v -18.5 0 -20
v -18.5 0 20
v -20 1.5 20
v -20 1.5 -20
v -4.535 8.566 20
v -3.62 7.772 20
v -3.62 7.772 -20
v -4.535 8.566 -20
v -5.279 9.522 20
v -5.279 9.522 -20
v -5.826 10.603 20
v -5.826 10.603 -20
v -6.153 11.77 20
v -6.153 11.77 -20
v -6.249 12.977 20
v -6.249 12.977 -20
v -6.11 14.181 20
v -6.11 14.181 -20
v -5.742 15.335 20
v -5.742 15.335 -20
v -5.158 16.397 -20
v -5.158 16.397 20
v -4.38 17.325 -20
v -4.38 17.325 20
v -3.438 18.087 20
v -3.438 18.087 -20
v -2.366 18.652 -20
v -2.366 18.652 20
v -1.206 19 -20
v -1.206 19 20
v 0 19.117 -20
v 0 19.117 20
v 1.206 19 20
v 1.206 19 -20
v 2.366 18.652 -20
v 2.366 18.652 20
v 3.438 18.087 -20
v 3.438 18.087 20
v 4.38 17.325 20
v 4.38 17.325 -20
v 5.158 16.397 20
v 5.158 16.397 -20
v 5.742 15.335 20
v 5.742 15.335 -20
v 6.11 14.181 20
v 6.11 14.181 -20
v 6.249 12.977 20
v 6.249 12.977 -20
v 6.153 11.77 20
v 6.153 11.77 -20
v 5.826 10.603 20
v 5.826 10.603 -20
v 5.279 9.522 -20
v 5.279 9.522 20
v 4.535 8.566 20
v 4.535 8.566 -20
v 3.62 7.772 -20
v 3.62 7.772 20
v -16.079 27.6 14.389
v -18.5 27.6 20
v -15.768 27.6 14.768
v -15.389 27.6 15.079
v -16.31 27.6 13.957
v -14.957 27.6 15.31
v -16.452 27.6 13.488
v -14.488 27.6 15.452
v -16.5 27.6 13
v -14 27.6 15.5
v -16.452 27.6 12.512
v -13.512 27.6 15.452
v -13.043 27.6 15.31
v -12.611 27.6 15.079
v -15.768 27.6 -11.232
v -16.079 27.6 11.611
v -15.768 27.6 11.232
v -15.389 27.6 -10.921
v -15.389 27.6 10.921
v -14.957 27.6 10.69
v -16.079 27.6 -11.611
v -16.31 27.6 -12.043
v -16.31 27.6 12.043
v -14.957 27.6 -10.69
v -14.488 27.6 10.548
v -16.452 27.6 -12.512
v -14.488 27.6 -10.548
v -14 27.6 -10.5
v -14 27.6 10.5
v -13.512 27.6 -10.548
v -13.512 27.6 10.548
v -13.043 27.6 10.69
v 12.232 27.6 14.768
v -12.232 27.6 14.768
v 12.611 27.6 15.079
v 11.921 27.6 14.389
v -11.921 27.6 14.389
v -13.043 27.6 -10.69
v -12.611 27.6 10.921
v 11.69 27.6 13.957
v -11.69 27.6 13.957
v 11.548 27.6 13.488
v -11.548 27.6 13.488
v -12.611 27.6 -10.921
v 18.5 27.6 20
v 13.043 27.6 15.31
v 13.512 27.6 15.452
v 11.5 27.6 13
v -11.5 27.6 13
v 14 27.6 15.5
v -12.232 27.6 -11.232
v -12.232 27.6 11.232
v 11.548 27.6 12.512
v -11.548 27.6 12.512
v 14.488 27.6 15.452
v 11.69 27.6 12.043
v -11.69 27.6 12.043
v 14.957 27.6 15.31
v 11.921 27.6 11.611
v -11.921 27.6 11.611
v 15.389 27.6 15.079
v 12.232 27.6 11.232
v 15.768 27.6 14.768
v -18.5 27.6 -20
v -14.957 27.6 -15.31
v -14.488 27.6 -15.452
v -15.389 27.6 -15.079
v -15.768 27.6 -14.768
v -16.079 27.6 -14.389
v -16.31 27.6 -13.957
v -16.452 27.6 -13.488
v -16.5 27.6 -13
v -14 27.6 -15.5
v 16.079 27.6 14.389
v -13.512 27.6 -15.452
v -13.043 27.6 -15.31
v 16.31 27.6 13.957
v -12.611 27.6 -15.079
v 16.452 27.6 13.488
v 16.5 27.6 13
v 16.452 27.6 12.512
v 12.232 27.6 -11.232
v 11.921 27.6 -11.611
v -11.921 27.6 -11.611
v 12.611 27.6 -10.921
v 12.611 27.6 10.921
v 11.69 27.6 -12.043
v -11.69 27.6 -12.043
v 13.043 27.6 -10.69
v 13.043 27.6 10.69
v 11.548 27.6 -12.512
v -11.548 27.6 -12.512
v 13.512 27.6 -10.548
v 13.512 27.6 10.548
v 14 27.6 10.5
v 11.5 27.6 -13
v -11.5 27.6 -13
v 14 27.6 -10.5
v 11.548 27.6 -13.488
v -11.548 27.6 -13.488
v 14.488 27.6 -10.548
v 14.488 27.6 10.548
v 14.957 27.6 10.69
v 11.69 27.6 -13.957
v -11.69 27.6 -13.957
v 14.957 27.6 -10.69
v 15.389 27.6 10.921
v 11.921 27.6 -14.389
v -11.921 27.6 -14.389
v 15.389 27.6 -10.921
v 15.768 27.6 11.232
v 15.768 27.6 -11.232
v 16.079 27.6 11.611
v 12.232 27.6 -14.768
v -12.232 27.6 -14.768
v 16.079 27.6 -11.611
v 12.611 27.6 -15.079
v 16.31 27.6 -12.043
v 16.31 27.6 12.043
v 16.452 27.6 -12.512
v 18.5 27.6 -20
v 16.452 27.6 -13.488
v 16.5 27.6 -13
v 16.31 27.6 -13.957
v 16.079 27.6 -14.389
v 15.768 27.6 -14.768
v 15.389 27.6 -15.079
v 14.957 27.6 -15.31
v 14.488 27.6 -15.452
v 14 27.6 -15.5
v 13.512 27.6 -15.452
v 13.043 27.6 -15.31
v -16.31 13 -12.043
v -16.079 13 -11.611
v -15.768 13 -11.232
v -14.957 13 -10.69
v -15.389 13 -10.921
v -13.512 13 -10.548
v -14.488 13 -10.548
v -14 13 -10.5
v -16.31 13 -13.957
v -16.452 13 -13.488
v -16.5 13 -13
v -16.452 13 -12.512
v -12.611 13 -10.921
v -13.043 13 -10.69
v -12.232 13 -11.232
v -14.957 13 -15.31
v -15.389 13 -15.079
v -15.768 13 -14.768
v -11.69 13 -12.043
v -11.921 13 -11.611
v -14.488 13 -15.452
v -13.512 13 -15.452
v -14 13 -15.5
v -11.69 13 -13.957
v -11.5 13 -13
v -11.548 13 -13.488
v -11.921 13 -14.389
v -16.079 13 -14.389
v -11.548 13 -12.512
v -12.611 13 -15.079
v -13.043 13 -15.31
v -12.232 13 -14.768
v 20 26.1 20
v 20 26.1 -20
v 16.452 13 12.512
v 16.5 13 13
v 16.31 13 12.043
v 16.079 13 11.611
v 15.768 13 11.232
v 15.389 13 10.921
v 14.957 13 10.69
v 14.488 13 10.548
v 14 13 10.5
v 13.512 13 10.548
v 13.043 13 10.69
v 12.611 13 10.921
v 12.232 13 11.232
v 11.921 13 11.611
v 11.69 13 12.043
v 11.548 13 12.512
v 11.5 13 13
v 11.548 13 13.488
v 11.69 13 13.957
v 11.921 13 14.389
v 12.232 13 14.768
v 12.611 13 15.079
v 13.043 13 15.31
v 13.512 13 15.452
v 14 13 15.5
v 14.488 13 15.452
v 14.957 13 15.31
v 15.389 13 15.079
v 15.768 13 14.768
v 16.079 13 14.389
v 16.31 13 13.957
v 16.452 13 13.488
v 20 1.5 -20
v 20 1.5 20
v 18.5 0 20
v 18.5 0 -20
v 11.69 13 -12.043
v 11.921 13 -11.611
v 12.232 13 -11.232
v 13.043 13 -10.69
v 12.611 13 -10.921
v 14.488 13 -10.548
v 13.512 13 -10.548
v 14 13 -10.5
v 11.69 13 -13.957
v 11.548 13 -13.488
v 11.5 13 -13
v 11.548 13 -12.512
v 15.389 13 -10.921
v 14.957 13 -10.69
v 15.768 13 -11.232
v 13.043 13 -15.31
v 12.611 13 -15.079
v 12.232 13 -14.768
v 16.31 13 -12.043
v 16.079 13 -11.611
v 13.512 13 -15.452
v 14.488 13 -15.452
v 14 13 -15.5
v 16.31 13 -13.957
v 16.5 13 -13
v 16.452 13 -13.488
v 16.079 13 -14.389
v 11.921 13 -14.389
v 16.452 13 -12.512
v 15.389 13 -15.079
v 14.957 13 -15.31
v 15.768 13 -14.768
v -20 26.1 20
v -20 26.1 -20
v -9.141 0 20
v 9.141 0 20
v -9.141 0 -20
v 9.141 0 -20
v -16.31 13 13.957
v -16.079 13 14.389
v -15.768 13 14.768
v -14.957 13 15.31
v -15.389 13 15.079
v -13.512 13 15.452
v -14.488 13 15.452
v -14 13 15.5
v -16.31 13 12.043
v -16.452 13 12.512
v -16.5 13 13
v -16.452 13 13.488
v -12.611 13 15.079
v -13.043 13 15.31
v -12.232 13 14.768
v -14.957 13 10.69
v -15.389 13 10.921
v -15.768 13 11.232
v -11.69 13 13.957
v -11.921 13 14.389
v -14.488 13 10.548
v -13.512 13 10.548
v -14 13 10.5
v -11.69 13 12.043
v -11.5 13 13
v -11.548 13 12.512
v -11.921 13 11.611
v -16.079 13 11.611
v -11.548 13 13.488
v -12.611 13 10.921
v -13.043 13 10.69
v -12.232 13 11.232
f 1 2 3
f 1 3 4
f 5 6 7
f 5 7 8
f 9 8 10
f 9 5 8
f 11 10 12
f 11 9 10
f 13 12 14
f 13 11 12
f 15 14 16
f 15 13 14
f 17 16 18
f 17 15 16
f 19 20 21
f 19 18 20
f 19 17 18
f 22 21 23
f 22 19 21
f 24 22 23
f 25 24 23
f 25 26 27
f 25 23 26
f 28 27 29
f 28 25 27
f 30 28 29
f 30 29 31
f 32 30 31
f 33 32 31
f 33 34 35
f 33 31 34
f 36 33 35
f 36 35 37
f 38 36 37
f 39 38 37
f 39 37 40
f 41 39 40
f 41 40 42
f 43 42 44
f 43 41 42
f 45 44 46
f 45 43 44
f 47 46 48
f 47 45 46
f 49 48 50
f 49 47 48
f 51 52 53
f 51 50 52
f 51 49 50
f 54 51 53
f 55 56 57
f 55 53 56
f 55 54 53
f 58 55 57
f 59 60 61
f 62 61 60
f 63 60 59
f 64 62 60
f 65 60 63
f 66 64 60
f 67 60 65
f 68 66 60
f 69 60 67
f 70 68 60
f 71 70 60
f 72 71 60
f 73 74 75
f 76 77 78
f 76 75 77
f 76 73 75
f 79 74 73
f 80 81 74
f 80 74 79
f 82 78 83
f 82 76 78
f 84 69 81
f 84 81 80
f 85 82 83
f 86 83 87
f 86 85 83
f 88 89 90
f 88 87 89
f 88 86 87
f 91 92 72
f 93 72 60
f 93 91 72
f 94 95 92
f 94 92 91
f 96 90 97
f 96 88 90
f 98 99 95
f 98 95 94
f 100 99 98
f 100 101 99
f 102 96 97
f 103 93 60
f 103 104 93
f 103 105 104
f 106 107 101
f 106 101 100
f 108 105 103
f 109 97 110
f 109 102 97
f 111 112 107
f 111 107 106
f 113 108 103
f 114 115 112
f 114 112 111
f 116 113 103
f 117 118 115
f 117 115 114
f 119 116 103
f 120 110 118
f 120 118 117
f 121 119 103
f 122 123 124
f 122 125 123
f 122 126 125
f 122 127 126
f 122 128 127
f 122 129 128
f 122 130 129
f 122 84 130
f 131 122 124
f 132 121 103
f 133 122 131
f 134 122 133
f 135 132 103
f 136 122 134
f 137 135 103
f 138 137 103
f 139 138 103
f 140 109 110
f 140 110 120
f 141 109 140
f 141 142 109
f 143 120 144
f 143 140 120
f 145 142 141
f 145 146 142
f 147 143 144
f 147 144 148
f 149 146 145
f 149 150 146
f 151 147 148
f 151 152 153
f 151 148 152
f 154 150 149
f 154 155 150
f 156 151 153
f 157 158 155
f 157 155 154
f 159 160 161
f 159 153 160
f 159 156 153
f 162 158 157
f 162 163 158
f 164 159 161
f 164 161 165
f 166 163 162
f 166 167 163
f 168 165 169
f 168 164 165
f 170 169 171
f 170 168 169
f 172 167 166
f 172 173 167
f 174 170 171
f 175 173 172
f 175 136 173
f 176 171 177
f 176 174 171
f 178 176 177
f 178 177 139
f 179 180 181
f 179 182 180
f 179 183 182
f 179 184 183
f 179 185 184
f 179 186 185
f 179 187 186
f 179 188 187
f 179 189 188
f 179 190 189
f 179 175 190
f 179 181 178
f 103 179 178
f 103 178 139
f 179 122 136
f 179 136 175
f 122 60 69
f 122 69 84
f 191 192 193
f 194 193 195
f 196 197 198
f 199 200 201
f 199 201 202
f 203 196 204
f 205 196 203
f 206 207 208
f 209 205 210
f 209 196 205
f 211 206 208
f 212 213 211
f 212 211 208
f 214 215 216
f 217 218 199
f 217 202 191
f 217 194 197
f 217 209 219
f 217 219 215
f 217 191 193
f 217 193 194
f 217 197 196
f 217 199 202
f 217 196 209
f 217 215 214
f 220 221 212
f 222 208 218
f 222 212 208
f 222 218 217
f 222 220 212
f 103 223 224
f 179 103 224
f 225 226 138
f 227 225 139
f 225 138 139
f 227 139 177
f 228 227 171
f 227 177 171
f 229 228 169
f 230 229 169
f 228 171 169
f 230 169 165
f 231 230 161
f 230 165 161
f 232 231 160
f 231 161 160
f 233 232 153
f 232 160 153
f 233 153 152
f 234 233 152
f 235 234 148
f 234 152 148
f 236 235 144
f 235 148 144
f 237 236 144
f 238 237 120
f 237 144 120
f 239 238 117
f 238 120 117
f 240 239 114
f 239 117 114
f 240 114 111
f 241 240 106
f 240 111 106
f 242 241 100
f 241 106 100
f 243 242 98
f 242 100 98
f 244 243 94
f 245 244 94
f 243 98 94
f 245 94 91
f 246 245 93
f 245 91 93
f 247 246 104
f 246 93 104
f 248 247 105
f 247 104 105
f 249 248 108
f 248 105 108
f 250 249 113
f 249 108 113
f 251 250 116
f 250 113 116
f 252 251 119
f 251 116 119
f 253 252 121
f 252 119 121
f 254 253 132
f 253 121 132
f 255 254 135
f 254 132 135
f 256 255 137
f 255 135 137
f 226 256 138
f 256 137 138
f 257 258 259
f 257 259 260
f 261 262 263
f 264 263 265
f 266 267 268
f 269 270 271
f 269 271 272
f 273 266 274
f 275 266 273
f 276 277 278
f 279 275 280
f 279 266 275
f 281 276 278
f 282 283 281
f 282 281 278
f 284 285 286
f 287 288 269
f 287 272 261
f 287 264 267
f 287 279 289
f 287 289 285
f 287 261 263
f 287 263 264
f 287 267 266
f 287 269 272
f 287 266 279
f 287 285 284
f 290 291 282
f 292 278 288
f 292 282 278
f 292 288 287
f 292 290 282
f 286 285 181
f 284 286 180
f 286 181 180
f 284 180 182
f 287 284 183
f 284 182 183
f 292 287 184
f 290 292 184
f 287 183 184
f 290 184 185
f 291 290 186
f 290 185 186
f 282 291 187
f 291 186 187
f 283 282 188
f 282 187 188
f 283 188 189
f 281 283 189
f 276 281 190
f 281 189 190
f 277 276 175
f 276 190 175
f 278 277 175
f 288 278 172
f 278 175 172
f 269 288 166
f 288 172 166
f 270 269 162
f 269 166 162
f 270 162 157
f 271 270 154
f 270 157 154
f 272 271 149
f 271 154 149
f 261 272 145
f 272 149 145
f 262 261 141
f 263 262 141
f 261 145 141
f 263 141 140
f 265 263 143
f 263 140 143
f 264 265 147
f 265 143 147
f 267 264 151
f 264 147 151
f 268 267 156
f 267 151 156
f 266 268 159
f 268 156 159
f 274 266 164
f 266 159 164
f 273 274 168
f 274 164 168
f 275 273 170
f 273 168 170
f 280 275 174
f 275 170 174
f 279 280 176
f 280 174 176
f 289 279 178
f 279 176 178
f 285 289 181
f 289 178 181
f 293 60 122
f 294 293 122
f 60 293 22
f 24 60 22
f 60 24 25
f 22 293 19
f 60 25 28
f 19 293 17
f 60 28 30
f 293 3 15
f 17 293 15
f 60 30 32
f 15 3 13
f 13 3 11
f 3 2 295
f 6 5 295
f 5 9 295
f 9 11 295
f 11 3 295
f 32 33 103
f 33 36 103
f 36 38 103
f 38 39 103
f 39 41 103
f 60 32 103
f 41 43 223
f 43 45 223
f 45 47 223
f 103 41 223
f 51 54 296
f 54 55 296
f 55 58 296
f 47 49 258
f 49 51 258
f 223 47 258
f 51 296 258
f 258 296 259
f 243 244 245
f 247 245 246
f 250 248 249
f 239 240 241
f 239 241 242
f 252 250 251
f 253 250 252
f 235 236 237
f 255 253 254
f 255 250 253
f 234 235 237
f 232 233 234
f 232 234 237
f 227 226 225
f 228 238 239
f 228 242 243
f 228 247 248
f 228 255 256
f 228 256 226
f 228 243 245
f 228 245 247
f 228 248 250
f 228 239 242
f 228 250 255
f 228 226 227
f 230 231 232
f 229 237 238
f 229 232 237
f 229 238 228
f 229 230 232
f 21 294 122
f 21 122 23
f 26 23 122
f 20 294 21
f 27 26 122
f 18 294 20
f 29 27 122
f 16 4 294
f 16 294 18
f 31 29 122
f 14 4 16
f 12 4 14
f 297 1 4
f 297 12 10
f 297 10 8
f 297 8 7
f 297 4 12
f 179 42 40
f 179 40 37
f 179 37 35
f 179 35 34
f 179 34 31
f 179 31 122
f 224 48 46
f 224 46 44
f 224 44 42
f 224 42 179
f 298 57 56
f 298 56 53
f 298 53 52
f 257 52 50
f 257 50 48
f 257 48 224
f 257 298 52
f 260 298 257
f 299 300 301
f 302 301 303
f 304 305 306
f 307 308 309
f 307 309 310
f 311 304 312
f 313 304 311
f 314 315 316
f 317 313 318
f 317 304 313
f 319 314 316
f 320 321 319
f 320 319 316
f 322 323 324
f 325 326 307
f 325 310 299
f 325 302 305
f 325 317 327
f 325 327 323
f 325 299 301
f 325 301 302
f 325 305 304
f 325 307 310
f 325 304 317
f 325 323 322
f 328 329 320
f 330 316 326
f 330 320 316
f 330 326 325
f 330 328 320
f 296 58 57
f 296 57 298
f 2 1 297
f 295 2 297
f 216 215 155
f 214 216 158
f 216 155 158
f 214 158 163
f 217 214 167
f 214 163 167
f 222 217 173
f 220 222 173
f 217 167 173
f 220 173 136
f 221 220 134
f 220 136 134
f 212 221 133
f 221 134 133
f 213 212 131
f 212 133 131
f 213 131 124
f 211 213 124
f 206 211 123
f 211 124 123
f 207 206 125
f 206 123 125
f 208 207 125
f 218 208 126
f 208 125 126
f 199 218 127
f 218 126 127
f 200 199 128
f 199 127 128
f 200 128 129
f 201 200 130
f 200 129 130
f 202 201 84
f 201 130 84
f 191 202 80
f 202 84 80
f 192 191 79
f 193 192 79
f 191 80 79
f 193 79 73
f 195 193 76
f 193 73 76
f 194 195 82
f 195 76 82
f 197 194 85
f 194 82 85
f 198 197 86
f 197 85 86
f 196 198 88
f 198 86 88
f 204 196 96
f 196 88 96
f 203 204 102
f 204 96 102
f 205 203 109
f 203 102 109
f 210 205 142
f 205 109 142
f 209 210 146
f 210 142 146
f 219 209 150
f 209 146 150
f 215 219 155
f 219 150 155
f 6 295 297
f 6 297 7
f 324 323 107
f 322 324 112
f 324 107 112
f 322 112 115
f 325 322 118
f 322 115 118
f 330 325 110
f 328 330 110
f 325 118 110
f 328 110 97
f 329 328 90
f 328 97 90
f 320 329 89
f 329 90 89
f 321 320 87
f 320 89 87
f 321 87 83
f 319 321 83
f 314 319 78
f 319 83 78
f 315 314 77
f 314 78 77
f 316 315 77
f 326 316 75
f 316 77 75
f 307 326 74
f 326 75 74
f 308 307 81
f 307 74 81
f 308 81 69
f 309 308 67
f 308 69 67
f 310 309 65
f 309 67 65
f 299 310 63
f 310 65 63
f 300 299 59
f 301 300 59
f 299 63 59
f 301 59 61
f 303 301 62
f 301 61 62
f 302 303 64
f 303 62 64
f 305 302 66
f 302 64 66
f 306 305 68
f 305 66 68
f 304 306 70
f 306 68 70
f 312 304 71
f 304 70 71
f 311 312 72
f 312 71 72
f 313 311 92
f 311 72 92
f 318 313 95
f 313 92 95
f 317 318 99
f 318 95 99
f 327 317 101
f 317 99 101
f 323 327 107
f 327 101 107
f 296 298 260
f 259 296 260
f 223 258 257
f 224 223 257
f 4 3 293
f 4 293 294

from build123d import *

# Parameters (mm, degrees)
SKETCH1_W           = 40
SKETCH1_H           = 40
BOSS_EXTRUDE1_DEPTH = 27.6
CUT_EXTRUDE1_DEPTH  = 41
SKETCH3_R           = 2.5
CUT_EXTRUDE2_DEPTH  = 14.6
CHAMFER1_SIZE       = 1.5


with BuildPart() as part:
    # Sketch1 → Boss-Extrude1 (new body)
    with BuildSketch(Plane(origin=(0, 0, 0), x_dir=(1, 0, 0), z_dir=(0, 1, 0))):
        Rectangle(SKETCH1_W, SKETCH1_H)
    extrude(amount=BOSS_EXTRUDE1_DEPTH)

    # Sketch2 → Cut-Extrude1 (cut, through all)
    with BuildSketch(Plane.XY.offset(20)):
        with BuildLine():
            Line((9.141218295, 0), (-9.141218295, 0))
            Line((-9.141218295, 0), (-3.619707233, 7.772105397))
            ThreePointArc((-3.619707233, 7.772105397), (0, 19.117222623), (3.619707233, 7.772105397))
            Line((3.619707233, 7.772105397), (9.141218295, 0))
        make_face()
    extrude(amount=-CUT_EXTRUDE1_DEPTH, mode=Mode.SUBTRACT)

    # Sketch3 → Cut-Extrude2 (cut)
    with BuildSketch(Plane(origin=(0, 27.6, 0), x_dir=(1, 0, 0), z_dir=(0, 1, 0))):
        with Locations((-14, 13)):
            Circle(SKETCH3_R)
        with Locations((14, 13)):
            Circle(SKETCH3_R)
        with Locations((14, -13)):
            Circle(SKETCH3_R)
        with Locations((-14, -13)):
            Circle(SKETCH3_R)
    extrude(amount=-CUT_EXTRUDE2_DEPTH, mode=Mode.SUBTRACT)

    # Chamfer1
    chamfer1_edges = [part.edges().sort_by_distance(p)[0] for p in [
        (-20, 27.6, 0),
        (20, 27.6, 0),
        (-20, 0, 0),
        (20, 0, 0),
    ]]
    chamfer(chamfer1_edges, length=CHAMFER1_SIZE)


solid = part.part
